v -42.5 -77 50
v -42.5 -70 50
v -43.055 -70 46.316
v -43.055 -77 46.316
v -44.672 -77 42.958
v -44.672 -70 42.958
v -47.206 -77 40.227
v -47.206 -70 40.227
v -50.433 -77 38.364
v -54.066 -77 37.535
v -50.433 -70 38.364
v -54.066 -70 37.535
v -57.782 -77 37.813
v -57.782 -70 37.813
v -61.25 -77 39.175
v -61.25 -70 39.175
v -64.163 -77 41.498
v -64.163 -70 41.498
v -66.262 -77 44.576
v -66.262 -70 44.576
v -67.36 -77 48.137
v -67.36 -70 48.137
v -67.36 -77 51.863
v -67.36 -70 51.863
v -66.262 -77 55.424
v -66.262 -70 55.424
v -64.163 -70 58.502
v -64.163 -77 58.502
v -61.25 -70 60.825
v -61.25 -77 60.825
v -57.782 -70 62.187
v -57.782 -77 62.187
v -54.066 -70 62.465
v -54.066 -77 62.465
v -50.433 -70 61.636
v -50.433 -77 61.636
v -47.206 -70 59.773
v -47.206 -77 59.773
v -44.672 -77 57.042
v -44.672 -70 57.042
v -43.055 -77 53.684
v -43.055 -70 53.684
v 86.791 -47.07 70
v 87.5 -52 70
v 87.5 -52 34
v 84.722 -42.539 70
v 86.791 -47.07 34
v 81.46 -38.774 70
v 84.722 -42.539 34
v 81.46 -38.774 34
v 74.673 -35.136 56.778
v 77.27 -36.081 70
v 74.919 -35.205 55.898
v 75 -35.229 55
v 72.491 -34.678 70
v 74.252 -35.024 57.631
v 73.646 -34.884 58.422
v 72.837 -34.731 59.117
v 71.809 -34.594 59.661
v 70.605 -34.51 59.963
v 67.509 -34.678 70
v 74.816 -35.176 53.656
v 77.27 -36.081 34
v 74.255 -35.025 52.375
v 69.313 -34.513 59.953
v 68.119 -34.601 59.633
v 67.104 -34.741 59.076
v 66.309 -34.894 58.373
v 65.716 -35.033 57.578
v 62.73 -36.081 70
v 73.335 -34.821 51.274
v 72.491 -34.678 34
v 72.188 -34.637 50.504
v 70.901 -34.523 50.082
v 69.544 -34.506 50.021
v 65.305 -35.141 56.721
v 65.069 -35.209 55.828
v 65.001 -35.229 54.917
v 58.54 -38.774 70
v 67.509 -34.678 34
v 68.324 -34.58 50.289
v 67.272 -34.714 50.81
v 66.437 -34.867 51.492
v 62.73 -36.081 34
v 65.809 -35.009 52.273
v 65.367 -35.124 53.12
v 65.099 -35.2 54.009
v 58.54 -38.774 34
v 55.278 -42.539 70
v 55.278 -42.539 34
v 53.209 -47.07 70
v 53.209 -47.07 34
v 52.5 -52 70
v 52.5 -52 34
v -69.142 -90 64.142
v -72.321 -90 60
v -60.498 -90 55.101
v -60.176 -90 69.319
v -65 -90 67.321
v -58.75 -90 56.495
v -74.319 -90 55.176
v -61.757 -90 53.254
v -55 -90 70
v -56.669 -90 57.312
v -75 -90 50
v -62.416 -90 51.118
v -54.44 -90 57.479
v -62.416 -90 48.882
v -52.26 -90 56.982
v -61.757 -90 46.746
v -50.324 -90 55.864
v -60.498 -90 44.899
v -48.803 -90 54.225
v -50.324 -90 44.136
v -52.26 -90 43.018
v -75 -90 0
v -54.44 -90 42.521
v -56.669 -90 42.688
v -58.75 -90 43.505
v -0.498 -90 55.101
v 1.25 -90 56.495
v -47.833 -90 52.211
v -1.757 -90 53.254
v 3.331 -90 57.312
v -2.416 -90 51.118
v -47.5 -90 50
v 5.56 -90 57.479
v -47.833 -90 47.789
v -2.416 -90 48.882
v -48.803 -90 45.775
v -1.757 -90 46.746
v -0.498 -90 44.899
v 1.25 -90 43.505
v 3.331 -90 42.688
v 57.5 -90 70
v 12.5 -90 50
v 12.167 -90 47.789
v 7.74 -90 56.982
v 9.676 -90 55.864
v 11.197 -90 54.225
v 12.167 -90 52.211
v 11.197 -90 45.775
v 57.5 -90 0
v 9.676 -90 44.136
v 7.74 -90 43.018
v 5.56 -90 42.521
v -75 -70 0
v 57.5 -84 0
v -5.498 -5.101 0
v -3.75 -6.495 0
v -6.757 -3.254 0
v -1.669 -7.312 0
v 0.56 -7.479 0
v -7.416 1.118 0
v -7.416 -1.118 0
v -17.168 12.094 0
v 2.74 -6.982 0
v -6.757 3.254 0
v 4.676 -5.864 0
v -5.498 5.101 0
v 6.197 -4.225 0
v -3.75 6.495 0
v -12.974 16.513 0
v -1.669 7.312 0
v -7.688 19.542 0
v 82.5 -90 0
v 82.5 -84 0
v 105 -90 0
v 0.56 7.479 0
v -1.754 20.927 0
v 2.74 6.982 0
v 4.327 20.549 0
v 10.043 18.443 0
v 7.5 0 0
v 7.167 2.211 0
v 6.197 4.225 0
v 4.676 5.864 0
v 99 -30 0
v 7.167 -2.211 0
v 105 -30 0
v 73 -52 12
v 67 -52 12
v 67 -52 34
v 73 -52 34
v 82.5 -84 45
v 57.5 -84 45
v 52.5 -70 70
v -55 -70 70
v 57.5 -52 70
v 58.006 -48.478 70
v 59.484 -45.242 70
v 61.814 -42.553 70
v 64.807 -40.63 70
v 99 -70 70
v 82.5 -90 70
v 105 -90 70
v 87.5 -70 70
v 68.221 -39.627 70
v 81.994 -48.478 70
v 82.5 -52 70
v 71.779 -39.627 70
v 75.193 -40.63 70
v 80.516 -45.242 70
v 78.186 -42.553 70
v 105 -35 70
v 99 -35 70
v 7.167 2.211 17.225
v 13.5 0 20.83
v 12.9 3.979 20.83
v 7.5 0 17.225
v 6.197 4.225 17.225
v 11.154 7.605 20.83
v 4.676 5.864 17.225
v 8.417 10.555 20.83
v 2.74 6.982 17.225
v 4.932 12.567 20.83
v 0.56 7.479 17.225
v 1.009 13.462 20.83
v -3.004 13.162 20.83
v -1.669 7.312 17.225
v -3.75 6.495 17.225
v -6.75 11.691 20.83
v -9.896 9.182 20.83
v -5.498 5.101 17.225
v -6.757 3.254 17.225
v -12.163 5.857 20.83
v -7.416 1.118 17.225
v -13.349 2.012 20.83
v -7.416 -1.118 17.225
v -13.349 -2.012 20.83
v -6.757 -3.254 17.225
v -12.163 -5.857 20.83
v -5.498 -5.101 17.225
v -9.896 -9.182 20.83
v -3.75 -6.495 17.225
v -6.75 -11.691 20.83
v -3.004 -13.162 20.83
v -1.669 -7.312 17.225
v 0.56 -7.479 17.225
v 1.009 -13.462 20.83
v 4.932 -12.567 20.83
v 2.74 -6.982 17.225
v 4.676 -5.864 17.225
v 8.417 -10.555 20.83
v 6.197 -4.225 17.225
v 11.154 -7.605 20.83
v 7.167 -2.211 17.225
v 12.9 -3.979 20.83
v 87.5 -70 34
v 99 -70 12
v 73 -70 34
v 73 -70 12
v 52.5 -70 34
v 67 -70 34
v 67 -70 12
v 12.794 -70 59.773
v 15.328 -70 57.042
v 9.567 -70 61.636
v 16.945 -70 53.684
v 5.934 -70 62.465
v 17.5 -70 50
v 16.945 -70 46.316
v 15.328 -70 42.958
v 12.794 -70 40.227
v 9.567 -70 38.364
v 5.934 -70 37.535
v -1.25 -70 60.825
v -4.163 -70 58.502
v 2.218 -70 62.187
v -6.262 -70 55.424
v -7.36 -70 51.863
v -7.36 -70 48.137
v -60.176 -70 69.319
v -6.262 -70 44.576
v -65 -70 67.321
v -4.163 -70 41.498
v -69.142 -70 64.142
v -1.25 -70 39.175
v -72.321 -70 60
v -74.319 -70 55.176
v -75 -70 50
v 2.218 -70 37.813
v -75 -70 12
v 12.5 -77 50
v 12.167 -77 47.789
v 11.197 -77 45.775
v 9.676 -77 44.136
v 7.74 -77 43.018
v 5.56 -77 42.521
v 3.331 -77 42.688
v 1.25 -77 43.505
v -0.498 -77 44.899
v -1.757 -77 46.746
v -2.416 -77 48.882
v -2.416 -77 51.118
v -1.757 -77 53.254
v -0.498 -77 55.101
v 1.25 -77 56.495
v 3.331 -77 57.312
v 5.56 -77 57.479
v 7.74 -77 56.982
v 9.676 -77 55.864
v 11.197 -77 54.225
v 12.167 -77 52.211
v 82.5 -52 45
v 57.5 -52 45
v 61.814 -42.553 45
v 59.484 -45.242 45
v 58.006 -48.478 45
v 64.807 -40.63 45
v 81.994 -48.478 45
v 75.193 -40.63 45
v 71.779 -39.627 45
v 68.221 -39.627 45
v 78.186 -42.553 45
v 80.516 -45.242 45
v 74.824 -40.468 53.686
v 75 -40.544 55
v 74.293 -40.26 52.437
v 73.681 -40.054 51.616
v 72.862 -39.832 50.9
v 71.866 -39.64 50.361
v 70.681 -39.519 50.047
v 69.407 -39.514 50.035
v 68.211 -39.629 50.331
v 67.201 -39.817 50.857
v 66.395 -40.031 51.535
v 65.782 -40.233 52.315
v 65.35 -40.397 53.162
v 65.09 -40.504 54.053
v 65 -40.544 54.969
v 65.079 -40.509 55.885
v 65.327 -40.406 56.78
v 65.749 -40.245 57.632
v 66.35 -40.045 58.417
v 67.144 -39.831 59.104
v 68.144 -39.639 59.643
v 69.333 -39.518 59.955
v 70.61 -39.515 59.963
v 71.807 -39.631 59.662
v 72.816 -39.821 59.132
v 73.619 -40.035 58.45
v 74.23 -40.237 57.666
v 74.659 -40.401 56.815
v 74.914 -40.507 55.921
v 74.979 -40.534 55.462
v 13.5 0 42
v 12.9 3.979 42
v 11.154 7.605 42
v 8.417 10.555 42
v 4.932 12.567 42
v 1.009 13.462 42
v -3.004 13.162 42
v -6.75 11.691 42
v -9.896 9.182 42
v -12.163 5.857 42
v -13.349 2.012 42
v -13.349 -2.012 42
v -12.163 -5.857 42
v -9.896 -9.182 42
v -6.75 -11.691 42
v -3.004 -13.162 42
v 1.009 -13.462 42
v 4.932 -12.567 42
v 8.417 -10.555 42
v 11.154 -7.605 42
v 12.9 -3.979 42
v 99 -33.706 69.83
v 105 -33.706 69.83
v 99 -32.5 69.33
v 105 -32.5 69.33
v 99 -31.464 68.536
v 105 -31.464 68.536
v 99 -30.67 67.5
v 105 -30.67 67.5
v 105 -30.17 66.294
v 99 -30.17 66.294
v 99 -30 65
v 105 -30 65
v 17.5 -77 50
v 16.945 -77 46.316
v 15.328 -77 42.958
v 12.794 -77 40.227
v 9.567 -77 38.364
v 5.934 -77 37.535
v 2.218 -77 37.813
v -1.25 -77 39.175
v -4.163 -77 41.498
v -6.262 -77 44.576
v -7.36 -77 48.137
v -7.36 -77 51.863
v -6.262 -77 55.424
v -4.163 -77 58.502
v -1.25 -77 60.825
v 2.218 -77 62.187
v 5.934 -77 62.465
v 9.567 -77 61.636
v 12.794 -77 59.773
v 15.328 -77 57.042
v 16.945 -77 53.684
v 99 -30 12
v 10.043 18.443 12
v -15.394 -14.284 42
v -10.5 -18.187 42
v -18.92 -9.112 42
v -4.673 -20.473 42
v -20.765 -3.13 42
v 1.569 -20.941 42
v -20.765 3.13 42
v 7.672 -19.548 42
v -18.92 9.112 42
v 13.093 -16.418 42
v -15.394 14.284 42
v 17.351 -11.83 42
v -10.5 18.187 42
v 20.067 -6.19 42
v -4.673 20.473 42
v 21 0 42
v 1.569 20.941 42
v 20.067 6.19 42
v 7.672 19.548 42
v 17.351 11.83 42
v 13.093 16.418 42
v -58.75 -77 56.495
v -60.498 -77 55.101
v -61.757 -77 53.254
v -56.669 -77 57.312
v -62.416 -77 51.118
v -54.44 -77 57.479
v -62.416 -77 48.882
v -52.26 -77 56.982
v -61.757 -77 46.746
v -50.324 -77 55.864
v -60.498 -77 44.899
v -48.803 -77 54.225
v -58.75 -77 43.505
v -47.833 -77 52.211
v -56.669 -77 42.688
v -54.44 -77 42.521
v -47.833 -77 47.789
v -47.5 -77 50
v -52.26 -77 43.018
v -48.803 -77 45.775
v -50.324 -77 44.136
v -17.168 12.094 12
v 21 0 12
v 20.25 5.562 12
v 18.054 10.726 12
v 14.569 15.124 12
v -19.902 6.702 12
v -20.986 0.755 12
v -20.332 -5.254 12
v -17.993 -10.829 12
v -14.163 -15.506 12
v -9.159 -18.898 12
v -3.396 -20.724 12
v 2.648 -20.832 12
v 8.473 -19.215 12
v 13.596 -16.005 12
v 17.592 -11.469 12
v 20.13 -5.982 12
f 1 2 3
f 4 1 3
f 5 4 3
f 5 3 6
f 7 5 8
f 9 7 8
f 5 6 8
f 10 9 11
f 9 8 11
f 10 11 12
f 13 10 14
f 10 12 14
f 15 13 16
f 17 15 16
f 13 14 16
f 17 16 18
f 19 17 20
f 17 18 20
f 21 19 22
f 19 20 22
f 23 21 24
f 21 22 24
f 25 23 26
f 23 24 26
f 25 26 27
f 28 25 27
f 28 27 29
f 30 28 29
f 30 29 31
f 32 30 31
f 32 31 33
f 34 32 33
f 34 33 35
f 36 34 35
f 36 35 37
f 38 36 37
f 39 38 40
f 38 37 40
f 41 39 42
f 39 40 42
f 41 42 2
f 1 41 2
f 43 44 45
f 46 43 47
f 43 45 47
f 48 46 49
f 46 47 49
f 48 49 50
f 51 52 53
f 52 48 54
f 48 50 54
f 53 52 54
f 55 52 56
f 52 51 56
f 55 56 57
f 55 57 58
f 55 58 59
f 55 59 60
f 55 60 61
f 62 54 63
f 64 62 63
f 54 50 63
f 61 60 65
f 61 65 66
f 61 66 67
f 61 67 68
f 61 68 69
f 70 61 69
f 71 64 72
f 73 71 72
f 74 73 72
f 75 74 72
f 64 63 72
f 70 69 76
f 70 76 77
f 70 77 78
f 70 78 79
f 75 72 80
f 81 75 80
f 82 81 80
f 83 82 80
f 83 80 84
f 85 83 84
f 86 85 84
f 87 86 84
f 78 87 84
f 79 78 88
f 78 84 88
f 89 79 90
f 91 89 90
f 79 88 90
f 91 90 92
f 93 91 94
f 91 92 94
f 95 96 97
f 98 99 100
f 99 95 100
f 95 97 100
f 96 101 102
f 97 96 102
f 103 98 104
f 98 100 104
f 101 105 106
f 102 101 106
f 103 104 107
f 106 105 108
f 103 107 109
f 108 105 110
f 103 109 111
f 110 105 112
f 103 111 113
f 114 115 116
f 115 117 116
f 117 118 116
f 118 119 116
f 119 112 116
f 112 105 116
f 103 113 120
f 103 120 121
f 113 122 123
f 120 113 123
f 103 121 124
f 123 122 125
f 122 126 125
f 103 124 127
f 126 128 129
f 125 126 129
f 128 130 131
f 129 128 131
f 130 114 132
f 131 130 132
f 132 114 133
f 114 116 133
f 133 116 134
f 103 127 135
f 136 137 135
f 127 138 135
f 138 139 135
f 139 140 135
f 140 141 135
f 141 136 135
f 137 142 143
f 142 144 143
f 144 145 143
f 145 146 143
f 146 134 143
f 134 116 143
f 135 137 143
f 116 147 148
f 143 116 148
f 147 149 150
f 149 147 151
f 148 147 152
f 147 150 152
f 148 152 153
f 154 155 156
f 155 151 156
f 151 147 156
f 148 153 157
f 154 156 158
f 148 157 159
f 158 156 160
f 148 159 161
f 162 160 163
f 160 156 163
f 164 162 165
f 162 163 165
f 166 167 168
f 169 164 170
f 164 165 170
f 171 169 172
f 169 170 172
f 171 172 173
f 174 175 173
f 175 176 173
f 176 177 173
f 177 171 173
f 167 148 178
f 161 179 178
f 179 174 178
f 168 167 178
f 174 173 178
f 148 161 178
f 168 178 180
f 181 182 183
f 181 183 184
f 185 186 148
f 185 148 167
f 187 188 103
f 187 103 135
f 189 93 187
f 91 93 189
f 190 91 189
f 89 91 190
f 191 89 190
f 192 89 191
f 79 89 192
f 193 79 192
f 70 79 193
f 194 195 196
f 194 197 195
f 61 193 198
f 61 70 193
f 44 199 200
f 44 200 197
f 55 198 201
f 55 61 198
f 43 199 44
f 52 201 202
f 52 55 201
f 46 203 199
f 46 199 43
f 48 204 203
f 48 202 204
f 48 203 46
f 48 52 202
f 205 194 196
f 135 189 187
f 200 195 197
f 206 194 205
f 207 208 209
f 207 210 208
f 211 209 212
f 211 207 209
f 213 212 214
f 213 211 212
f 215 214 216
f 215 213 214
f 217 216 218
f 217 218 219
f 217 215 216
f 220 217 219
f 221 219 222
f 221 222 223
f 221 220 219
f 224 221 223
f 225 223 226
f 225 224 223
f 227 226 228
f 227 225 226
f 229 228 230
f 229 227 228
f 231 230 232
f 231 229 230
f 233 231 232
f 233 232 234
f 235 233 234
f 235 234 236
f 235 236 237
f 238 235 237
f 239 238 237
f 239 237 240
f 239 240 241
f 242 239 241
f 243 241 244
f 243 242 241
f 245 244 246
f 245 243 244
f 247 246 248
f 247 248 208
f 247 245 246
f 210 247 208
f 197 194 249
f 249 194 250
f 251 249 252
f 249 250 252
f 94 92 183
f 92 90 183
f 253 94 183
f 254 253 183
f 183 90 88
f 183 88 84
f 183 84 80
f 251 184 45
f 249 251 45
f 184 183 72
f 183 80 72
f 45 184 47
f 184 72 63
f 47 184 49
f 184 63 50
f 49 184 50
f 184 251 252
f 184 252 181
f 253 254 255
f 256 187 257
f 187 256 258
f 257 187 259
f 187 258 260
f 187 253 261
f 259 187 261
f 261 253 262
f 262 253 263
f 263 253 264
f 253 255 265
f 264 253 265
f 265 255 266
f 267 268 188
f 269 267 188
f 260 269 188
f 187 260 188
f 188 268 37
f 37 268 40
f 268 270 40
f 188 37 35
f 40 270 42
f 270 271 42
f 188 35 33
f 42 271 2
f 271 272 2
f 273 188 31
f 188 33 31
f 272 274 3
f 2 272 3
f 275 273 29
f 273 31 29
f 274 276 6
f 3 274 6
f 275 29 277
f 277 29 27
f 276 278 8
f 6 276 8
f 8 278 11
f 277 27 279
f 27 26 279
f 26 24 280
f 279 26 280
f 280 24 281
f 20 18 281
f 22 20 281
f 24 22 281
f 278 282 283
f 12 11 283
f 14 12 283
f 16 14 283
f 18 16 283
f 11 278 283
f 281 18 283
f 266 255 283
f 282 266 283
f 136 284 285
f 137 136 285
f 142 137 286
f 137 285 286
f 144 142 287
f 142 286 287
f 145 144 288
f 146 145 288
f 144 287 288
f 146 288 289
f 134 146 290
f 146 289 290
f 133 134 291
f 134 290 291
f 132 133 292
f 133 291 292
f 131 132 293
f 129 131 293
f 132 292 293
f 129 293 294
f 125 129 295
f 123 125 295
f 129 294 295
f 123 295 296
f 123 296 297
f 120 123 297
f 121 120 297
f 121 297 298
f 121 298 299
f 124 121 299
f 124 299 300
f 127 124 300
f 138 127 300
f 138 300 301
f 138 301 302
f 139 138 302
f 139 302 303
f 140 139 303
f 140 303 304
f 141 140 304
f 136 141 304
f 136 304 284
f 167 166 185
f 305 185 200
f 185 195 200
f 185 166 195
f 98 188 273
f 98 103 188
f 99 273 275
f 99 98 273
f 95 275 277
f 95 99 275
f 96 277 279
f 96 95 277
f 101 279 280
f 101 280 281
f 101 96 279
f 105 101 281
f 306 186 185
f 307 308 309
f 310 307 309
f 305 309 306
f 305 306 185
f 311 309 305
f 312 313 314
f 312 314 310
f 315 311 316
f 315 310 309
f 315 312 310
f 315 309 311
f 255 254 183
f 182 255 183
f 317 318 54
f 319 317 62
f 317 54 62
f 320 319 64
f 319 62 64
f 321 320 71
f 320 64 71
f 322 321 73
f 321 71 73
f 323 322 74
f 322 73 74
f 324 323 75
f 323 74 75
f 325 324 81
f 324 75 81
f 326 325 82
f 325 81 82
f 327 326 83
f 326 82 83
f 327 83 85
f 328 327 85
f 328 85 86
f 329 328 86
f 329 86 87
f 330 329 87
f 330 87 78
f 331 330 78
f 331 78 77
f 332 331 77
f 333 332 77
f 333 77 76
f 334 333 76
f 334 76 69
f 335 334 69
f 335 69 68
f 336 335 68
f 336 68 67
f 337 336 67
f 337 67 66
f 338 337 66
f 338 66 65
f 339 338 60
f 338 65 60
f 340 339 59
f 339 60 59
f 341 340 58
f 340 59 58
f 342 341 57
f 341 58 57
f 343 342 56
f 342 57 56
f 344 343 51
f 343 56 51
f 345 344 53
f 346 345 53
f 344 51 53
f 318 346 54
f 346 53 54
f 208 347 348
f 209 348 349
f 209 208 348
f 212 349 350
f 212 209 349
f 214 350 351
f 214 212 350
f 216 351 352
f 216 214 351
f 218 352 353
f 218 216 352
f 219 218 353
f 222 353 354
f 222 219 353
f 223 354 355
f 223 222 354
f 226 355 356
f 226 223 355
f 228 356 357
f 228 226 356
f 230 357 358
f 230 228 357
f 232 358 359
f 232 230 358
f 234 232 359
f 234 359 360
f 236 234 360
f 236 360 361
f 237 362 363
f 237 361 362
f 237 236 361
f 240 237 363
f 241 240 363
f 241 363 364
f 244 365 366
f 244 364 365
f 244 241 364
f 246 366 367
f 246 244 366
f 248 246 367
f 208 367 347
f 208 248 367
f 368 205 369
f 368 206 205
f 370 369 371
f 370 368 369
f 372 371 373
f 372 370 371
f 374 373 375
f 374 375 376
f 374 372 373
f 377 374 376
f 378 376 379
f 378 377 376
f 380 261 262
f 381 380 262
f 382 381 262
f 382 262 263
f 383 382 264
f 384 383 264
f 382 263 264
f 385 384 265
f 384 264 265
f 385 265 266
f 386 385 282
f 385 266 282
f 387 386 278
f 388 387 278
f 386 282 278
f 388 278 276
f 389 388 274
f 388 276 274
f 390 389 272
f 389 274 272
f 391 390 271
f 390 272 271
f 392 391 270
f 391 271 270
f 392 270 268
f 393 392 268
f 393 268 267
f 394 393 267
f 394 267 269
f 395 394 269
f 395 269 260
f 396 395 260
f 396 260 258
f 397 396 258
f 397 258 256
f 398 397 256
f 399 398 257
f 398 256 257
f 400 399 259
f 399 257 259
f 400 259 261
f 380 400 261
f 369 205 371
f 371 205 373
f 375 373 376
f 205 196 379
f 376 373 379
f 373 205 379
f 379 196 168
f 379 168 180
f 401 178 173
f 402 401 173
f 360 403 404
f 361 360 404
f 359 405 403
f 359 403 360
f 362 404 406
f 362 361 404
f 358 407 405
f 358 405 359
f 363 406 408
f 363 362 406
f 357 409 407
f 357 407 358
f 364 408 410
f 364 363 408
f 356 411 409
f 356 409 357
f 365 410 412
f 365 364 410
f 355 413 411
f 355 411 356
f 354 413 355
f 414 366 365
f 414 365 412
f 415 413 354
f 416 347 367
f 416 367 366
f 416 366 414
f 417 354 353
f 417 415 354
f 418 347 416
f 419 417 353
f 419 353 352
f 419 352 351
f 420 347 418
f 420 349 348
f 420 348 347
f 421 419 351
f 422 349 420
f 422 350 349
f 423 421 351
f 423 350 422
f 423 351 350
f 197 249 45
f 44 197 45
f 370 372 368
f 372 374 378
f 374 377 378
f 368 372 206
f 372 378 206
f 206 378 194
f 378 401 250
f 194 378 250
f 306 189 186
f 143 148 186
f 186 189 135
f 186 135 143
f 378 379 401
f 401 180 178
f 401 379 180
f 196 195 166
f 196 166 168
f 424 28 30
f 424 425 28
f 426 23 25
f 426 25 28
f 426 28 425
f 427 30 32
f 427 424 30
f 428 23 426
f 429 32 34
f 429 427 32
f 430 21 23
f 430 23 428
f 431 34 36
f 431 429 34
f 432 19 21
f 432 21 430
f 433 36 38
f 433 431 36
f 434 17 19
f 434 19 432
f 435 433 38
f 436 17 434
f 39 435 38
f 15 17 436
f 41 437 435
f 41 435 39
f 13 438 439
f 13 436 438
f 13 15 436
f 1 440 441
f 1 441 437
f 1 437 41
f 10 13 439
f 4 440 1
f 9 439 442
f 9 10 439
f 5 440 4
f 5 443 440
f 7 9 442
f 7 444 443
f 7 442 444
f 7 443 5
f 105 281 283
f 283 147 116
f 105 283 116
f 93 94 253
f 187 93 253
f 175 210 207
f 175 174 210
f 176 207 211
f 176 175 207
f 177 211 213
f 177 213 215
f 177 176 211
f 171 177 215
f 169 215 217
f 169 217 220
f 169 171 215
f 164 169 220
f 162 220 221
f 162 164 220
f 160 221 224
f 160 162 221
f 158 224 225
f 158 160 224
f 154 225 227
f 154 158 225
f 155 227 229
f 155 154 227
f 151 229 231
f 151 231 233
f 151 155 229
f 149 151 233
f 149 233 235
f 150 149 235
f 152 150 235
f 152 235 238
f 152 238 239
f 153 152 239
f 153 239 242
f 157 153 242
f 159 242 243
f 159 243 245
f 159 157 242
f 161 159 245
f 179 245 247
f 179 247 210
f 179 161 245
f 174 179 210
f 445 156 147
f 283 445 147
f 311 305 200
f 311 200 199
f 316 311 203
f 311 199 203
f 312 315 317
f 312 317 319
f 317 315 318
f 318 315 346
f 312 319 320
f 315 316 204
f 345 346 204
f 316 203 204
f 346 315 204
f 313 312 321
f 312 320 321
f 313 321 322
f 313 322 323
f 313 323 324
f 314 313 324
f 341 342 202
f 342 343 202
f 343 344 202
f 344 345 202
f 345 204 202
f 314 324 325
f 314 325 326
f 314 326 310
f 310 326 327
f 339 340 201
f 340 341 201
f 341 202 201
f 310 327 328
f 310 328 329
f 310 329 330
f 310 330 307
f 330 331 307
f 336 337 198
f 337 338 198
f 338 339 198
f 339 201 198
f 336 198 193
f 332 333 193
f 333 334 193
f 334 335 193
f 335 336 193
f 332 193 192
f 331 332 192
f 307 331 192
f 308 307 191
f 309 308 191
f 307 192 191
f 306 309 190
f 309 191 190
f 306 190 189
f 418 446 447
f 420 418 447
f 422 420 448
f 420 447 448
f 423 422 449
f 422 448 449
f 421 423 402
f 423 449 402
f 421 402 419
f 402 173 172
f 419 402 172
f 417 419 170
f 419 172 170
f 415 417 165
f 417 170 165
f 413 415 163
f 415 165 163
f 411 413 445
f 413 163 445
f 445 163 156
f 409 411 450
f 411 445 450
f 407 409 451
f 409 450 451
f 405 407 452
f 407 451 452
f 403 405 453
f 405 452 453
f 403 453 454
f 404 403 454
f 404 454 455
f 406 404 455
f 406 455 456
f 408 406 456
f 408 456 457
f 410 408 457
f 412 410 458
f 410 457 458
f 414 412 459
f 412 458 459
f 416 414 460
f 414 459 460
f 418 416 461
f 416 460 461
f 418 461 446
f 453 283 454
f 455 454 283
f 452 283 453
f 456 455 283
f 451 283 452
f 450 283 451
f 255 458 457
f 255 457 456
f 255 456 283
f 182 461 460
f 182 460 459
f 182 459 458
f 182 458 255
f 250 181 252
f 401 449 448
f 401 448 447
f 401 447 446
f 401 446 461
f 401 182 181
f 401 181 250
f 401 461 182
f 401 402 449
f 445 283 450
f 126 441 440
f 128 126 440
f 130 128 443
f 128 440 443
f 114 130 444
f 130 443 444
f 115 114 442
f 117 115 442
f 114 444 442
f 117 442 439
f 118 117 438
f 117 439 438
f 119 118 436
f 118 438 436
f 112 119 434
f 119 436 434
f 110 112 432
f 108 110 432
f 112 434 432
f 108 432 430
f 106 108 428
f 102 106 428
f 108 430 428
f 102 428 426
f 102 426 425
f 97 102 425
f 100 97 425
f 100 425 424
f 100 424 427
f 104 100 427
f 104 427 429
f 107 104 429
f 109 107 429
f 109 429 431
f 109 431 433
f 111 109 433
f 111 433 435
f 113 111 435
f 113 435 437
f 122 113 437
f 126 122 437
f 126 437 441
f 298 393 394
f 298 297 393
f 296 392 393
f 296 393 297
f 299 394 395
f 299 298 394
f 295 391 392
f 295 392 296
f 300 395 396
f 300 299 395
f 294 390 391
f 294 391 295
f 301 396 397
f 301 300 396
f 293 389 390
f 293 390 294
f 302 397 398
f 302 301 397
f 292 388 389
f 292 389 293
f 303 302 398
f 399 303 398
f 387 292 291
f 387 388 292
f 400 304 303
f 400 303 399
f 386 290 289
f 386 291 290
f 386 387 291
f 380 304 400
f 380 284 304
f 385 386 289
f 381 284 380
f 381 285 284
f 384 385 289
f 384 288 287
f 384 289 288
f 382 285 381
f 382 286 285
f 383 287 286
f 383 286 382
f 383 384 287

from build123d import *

# Parameters (mm, degrees)
SKETCH1_R               = 21
BOSS_EXTRUDE1_DEPTH     = 42
BOSS_EXTRUDE2_DEPTH     = 12
BOSS_EXTRUDE5_DEPTH     = 70
SKETCH2_W               = 35
SKETCH2_H               = 22
CUT_EXTRUDE2_DEPTH      = 70
CUT_EXTRUDE4_DEPTH      = 1
CUT_EXTRUDE4_DEPTH_BACK = 25
SKETCH5_W               = 6
SKETCH5_H               = 18
BOSS_EXTRUDE6_DEPTH     = 33
FILLET1_R               = 5
SKETCH8_W               = 25
SKETCH8_H               = 6
CUT_EXTRUDE6_DEPTH      = 167
SKETCH7_R               = 7.5
CUT_EXTRUDE7_DEPTH      = 167
SKETCH7_3_R             = 12.5
CUT_EXTRUDE8_DEPTH      = 7
FILLET2_R               = 20
SKETCH7_4_R             = 12.5
SKETCH7_4_R_2           = 7.5
CUT_EXTRUDE9_DEPTH      = 7
SKETCH7_5_R             = 7.5
CUT_EXTRUDE10_DEPTH     = 21
SKETCH11_R              = 5
CUT_EXTRUDE11_DEPTH     = 80


with BuildPart() as part:
    # Sketch1 → Boss-Extrude1 (new body)
    with BuildSketch(Plane.XY):
        Circle(SKETCH1_R)
    extrude(amount=BOSS_EXTRUDE1_DEPTH)

    # Sketch1<3> → Boss-Extrude2 (add)
    with BuildSketch(Plane.XY):
        with BuildLine():
            ThreePointArc((21, 0), (-6.343349758, -20.019038784), (-17.167801318, 12.094072841))
            Line((-17.167801318, 12.094072841), (-75, -70))
            Line((-75, -70), (52.5, -70))
            Line((52.5, -70), (52.5, -52))
            ThreePointArc((52.5, -52), (70, -34.5), (87.5, -52))
            Line((87.5, -52), (87.5, -70))
            Line((87.5, -70), (99, -70))
            Line((99, -70), (99, -30))
            Line((99, -30), (10.043243118, 18.442702288))
            ThreePointArc((10.043243118, 18.442702288), (18.054197649, 10.725947383), (21, 0))
        make_face()
    extrude(amount=BOSS_EXTRUDE2_DEPTH)

    # Sketch1<7> → Boss-Extrude5 (add)
    with BuildSketch(Plane.XY):
        with BuildLine():
            Line((52.5, -70), (-75, -70))
            Line((-75, -70), (-75, -90))
            Line((-75, -90), (105, -90))
            Line((105, -90), (105, -30))
            Line((105, -30), (99, -30))
            Line((99, -30), (99, -70))
            Line((99, -70), (87.5, -70))
            Line((87.5, -70), (87.5, -52))
            ThreePointArc((87.5, -52), (70, -34.5), (52.5, -52))
            Line((52.5, -52), (52.5, -70))
        make_face()
    extrude(amount=BOSS_EXTRUDE5_DEPTH)

    # Sketch2 → Cut-Extrude2 (cut)
    with BuildSketch(Plane(origin=(0, 0, 0), x_dir=(1, 0, 0), z_dir=(0, 1, 0))):
        with Locations((70, -23)):
            Rectangle(SKETCH2_W, SKETCH2_H)
    extrude(amount=-CUT_EXTRUDE2_DEPTH, mode=Mode.SUBTRACT)

    # Sketch3 → Cut-Extrude4 (cut, two sides)
    with BuildSketch(Plane.XY.offset(70)) as cut_extrude4_sk:
        with BuildLine():
            Line((57.5, -52), (57.5, -90))
            Line((57.5, -90), (82.5, -90))
            Line((82.5, -90), (82.5, -52))
            ThreePointArc((82.5, -52), (70, -39.5), (57.5, -52))
        make_face()
    extrude(amount=CUT_EXTRUDE4_DEPTH, mode=Mode.SUBTRACT)
    extrude(cut_extrude4_sk.sketch, amount=-CUT_EXTRUDE4_DEPTH_BACK, mode=Mode.SUBTRACT)

    # Sketch5 → Boss-Extrude6 (add)
    with BuildSketch(Plane.XY.offset(45)):
        with Locations((70, -61)):
            Rectangle(SKETCH5_W, SKETCH5_H)
    extrude(amount=-BOSS_EXTRUDE6_DEPTH)

    # Fillet1
    fillet1_edges = [part.edges().sort_by_distance(p)[0] for p in [
        (102, -30, 70),
    ]]
    fillet(fillet1_edges, radius=FILLET1_R)

    # Sketch8 → Cut-Extrude6 (cut)
    with BuildSketch(Plane.XY.offset(45)):
        with Locations((70, -87)):
            Rectangle(SKETCH8_W, SKETCH8_H)
    extrude(amount=-CUT_EXTRUDE6_DEPTH, mode=Mode.SUBTRACT)

    # Sketch7 → Cut-Extrude7 (cut)
    with BuildSketch(Plane(origin=(0, -70, 0), x_dir=(1, 0, 0), z_dir=(0, 1, 0))):
        with Locations((-55, -50)):
            Circle(SKETCH7_R)
    extrude(amount=-CUT_EXTRUDE7_DEPTH, mode=Mode.SUBTRACT)

    # Sketch7<3> → Cut-Extrude8 (cut)
    with BuildSketch(Plane(origin=(0, -70, 0), x_dir=(1, 0, 0), z_dir=(0, 1, 0))):
        with Locations((-55, -50)):
            Circle(SKETCH7_3_R)
    extrude(amount=-CUT_EXTRUDE8_DEPTH, mode=Mode.SUBTRACT)

    # Fillet2
    fillet2_edges = [part.edges().sort_by_distance(p)[0] for p in [
        (-75, -80, 70),
    ]]
    fillet(fillet2_edges, radius=FILLET2_R)

    # Sketch7<4> → Cut-Extrude9 (cut)
    with BuildSketch(Plane(origin=(0, -70, 0), x_dir=(1, 0, 0), z_dir=(0, 1, 0))):
        with Locations((5, -50)):
            Circle(SKETCH7_4_R)
        with Locations((5, -50)):
            Circle(SKETCH7_4_R_2, mode=Mode.SUBTRACT)
    extrude(amount=-CUT_EXTRUDE9_DEPTH, mode=Mode.SUBTRACT)

    # Sketch7<5> → Cut-Extrude10 (cut, through all)
    with BuildSketch(Plane(origin=(0, -70, 0), x_dir=(1, 0, 0), z_dir=(0, 1, 0))):
        with Locations((5, -50)):
            Circle(SKETCH7_5_R)
    extrude(amount=-CUT_EXTRUDE10_DEPTH, mode=Mode.SUBTRACT)

    # Sketch10 → Cut-Revolve1 (revolve, cut)
    with BuildSketch(Plane(origin=(0, 0, 0), x_dir=(1, 0, 0), z_dir=(0, 1, 0))):
        Polygon((0, 0), (0, -42.225297228), (13.5, -42.225297228), (13.5, -20.830460942), (7.5, -17.225297228), (7.5, 0), align=None)
    revolve(axis=Axis((0, 0, 0), (0, 0, 1)), mode=Mode.SUBTRACT)

    # Sketch11 → Cut-Extrude11 (cut)
    with BuildSketch(Plane(origin=(0, 0, 0), x_dir=(1, 0, 0), z_dir=(0, 1, 0))):
        with Locations((70, -55)):
            Circle(SKETCH11_R)
    extrude(amount=-CUT_EXTRUDE11_DEPTH, mode=Mode.SUBTRACT)


solid = part.part
